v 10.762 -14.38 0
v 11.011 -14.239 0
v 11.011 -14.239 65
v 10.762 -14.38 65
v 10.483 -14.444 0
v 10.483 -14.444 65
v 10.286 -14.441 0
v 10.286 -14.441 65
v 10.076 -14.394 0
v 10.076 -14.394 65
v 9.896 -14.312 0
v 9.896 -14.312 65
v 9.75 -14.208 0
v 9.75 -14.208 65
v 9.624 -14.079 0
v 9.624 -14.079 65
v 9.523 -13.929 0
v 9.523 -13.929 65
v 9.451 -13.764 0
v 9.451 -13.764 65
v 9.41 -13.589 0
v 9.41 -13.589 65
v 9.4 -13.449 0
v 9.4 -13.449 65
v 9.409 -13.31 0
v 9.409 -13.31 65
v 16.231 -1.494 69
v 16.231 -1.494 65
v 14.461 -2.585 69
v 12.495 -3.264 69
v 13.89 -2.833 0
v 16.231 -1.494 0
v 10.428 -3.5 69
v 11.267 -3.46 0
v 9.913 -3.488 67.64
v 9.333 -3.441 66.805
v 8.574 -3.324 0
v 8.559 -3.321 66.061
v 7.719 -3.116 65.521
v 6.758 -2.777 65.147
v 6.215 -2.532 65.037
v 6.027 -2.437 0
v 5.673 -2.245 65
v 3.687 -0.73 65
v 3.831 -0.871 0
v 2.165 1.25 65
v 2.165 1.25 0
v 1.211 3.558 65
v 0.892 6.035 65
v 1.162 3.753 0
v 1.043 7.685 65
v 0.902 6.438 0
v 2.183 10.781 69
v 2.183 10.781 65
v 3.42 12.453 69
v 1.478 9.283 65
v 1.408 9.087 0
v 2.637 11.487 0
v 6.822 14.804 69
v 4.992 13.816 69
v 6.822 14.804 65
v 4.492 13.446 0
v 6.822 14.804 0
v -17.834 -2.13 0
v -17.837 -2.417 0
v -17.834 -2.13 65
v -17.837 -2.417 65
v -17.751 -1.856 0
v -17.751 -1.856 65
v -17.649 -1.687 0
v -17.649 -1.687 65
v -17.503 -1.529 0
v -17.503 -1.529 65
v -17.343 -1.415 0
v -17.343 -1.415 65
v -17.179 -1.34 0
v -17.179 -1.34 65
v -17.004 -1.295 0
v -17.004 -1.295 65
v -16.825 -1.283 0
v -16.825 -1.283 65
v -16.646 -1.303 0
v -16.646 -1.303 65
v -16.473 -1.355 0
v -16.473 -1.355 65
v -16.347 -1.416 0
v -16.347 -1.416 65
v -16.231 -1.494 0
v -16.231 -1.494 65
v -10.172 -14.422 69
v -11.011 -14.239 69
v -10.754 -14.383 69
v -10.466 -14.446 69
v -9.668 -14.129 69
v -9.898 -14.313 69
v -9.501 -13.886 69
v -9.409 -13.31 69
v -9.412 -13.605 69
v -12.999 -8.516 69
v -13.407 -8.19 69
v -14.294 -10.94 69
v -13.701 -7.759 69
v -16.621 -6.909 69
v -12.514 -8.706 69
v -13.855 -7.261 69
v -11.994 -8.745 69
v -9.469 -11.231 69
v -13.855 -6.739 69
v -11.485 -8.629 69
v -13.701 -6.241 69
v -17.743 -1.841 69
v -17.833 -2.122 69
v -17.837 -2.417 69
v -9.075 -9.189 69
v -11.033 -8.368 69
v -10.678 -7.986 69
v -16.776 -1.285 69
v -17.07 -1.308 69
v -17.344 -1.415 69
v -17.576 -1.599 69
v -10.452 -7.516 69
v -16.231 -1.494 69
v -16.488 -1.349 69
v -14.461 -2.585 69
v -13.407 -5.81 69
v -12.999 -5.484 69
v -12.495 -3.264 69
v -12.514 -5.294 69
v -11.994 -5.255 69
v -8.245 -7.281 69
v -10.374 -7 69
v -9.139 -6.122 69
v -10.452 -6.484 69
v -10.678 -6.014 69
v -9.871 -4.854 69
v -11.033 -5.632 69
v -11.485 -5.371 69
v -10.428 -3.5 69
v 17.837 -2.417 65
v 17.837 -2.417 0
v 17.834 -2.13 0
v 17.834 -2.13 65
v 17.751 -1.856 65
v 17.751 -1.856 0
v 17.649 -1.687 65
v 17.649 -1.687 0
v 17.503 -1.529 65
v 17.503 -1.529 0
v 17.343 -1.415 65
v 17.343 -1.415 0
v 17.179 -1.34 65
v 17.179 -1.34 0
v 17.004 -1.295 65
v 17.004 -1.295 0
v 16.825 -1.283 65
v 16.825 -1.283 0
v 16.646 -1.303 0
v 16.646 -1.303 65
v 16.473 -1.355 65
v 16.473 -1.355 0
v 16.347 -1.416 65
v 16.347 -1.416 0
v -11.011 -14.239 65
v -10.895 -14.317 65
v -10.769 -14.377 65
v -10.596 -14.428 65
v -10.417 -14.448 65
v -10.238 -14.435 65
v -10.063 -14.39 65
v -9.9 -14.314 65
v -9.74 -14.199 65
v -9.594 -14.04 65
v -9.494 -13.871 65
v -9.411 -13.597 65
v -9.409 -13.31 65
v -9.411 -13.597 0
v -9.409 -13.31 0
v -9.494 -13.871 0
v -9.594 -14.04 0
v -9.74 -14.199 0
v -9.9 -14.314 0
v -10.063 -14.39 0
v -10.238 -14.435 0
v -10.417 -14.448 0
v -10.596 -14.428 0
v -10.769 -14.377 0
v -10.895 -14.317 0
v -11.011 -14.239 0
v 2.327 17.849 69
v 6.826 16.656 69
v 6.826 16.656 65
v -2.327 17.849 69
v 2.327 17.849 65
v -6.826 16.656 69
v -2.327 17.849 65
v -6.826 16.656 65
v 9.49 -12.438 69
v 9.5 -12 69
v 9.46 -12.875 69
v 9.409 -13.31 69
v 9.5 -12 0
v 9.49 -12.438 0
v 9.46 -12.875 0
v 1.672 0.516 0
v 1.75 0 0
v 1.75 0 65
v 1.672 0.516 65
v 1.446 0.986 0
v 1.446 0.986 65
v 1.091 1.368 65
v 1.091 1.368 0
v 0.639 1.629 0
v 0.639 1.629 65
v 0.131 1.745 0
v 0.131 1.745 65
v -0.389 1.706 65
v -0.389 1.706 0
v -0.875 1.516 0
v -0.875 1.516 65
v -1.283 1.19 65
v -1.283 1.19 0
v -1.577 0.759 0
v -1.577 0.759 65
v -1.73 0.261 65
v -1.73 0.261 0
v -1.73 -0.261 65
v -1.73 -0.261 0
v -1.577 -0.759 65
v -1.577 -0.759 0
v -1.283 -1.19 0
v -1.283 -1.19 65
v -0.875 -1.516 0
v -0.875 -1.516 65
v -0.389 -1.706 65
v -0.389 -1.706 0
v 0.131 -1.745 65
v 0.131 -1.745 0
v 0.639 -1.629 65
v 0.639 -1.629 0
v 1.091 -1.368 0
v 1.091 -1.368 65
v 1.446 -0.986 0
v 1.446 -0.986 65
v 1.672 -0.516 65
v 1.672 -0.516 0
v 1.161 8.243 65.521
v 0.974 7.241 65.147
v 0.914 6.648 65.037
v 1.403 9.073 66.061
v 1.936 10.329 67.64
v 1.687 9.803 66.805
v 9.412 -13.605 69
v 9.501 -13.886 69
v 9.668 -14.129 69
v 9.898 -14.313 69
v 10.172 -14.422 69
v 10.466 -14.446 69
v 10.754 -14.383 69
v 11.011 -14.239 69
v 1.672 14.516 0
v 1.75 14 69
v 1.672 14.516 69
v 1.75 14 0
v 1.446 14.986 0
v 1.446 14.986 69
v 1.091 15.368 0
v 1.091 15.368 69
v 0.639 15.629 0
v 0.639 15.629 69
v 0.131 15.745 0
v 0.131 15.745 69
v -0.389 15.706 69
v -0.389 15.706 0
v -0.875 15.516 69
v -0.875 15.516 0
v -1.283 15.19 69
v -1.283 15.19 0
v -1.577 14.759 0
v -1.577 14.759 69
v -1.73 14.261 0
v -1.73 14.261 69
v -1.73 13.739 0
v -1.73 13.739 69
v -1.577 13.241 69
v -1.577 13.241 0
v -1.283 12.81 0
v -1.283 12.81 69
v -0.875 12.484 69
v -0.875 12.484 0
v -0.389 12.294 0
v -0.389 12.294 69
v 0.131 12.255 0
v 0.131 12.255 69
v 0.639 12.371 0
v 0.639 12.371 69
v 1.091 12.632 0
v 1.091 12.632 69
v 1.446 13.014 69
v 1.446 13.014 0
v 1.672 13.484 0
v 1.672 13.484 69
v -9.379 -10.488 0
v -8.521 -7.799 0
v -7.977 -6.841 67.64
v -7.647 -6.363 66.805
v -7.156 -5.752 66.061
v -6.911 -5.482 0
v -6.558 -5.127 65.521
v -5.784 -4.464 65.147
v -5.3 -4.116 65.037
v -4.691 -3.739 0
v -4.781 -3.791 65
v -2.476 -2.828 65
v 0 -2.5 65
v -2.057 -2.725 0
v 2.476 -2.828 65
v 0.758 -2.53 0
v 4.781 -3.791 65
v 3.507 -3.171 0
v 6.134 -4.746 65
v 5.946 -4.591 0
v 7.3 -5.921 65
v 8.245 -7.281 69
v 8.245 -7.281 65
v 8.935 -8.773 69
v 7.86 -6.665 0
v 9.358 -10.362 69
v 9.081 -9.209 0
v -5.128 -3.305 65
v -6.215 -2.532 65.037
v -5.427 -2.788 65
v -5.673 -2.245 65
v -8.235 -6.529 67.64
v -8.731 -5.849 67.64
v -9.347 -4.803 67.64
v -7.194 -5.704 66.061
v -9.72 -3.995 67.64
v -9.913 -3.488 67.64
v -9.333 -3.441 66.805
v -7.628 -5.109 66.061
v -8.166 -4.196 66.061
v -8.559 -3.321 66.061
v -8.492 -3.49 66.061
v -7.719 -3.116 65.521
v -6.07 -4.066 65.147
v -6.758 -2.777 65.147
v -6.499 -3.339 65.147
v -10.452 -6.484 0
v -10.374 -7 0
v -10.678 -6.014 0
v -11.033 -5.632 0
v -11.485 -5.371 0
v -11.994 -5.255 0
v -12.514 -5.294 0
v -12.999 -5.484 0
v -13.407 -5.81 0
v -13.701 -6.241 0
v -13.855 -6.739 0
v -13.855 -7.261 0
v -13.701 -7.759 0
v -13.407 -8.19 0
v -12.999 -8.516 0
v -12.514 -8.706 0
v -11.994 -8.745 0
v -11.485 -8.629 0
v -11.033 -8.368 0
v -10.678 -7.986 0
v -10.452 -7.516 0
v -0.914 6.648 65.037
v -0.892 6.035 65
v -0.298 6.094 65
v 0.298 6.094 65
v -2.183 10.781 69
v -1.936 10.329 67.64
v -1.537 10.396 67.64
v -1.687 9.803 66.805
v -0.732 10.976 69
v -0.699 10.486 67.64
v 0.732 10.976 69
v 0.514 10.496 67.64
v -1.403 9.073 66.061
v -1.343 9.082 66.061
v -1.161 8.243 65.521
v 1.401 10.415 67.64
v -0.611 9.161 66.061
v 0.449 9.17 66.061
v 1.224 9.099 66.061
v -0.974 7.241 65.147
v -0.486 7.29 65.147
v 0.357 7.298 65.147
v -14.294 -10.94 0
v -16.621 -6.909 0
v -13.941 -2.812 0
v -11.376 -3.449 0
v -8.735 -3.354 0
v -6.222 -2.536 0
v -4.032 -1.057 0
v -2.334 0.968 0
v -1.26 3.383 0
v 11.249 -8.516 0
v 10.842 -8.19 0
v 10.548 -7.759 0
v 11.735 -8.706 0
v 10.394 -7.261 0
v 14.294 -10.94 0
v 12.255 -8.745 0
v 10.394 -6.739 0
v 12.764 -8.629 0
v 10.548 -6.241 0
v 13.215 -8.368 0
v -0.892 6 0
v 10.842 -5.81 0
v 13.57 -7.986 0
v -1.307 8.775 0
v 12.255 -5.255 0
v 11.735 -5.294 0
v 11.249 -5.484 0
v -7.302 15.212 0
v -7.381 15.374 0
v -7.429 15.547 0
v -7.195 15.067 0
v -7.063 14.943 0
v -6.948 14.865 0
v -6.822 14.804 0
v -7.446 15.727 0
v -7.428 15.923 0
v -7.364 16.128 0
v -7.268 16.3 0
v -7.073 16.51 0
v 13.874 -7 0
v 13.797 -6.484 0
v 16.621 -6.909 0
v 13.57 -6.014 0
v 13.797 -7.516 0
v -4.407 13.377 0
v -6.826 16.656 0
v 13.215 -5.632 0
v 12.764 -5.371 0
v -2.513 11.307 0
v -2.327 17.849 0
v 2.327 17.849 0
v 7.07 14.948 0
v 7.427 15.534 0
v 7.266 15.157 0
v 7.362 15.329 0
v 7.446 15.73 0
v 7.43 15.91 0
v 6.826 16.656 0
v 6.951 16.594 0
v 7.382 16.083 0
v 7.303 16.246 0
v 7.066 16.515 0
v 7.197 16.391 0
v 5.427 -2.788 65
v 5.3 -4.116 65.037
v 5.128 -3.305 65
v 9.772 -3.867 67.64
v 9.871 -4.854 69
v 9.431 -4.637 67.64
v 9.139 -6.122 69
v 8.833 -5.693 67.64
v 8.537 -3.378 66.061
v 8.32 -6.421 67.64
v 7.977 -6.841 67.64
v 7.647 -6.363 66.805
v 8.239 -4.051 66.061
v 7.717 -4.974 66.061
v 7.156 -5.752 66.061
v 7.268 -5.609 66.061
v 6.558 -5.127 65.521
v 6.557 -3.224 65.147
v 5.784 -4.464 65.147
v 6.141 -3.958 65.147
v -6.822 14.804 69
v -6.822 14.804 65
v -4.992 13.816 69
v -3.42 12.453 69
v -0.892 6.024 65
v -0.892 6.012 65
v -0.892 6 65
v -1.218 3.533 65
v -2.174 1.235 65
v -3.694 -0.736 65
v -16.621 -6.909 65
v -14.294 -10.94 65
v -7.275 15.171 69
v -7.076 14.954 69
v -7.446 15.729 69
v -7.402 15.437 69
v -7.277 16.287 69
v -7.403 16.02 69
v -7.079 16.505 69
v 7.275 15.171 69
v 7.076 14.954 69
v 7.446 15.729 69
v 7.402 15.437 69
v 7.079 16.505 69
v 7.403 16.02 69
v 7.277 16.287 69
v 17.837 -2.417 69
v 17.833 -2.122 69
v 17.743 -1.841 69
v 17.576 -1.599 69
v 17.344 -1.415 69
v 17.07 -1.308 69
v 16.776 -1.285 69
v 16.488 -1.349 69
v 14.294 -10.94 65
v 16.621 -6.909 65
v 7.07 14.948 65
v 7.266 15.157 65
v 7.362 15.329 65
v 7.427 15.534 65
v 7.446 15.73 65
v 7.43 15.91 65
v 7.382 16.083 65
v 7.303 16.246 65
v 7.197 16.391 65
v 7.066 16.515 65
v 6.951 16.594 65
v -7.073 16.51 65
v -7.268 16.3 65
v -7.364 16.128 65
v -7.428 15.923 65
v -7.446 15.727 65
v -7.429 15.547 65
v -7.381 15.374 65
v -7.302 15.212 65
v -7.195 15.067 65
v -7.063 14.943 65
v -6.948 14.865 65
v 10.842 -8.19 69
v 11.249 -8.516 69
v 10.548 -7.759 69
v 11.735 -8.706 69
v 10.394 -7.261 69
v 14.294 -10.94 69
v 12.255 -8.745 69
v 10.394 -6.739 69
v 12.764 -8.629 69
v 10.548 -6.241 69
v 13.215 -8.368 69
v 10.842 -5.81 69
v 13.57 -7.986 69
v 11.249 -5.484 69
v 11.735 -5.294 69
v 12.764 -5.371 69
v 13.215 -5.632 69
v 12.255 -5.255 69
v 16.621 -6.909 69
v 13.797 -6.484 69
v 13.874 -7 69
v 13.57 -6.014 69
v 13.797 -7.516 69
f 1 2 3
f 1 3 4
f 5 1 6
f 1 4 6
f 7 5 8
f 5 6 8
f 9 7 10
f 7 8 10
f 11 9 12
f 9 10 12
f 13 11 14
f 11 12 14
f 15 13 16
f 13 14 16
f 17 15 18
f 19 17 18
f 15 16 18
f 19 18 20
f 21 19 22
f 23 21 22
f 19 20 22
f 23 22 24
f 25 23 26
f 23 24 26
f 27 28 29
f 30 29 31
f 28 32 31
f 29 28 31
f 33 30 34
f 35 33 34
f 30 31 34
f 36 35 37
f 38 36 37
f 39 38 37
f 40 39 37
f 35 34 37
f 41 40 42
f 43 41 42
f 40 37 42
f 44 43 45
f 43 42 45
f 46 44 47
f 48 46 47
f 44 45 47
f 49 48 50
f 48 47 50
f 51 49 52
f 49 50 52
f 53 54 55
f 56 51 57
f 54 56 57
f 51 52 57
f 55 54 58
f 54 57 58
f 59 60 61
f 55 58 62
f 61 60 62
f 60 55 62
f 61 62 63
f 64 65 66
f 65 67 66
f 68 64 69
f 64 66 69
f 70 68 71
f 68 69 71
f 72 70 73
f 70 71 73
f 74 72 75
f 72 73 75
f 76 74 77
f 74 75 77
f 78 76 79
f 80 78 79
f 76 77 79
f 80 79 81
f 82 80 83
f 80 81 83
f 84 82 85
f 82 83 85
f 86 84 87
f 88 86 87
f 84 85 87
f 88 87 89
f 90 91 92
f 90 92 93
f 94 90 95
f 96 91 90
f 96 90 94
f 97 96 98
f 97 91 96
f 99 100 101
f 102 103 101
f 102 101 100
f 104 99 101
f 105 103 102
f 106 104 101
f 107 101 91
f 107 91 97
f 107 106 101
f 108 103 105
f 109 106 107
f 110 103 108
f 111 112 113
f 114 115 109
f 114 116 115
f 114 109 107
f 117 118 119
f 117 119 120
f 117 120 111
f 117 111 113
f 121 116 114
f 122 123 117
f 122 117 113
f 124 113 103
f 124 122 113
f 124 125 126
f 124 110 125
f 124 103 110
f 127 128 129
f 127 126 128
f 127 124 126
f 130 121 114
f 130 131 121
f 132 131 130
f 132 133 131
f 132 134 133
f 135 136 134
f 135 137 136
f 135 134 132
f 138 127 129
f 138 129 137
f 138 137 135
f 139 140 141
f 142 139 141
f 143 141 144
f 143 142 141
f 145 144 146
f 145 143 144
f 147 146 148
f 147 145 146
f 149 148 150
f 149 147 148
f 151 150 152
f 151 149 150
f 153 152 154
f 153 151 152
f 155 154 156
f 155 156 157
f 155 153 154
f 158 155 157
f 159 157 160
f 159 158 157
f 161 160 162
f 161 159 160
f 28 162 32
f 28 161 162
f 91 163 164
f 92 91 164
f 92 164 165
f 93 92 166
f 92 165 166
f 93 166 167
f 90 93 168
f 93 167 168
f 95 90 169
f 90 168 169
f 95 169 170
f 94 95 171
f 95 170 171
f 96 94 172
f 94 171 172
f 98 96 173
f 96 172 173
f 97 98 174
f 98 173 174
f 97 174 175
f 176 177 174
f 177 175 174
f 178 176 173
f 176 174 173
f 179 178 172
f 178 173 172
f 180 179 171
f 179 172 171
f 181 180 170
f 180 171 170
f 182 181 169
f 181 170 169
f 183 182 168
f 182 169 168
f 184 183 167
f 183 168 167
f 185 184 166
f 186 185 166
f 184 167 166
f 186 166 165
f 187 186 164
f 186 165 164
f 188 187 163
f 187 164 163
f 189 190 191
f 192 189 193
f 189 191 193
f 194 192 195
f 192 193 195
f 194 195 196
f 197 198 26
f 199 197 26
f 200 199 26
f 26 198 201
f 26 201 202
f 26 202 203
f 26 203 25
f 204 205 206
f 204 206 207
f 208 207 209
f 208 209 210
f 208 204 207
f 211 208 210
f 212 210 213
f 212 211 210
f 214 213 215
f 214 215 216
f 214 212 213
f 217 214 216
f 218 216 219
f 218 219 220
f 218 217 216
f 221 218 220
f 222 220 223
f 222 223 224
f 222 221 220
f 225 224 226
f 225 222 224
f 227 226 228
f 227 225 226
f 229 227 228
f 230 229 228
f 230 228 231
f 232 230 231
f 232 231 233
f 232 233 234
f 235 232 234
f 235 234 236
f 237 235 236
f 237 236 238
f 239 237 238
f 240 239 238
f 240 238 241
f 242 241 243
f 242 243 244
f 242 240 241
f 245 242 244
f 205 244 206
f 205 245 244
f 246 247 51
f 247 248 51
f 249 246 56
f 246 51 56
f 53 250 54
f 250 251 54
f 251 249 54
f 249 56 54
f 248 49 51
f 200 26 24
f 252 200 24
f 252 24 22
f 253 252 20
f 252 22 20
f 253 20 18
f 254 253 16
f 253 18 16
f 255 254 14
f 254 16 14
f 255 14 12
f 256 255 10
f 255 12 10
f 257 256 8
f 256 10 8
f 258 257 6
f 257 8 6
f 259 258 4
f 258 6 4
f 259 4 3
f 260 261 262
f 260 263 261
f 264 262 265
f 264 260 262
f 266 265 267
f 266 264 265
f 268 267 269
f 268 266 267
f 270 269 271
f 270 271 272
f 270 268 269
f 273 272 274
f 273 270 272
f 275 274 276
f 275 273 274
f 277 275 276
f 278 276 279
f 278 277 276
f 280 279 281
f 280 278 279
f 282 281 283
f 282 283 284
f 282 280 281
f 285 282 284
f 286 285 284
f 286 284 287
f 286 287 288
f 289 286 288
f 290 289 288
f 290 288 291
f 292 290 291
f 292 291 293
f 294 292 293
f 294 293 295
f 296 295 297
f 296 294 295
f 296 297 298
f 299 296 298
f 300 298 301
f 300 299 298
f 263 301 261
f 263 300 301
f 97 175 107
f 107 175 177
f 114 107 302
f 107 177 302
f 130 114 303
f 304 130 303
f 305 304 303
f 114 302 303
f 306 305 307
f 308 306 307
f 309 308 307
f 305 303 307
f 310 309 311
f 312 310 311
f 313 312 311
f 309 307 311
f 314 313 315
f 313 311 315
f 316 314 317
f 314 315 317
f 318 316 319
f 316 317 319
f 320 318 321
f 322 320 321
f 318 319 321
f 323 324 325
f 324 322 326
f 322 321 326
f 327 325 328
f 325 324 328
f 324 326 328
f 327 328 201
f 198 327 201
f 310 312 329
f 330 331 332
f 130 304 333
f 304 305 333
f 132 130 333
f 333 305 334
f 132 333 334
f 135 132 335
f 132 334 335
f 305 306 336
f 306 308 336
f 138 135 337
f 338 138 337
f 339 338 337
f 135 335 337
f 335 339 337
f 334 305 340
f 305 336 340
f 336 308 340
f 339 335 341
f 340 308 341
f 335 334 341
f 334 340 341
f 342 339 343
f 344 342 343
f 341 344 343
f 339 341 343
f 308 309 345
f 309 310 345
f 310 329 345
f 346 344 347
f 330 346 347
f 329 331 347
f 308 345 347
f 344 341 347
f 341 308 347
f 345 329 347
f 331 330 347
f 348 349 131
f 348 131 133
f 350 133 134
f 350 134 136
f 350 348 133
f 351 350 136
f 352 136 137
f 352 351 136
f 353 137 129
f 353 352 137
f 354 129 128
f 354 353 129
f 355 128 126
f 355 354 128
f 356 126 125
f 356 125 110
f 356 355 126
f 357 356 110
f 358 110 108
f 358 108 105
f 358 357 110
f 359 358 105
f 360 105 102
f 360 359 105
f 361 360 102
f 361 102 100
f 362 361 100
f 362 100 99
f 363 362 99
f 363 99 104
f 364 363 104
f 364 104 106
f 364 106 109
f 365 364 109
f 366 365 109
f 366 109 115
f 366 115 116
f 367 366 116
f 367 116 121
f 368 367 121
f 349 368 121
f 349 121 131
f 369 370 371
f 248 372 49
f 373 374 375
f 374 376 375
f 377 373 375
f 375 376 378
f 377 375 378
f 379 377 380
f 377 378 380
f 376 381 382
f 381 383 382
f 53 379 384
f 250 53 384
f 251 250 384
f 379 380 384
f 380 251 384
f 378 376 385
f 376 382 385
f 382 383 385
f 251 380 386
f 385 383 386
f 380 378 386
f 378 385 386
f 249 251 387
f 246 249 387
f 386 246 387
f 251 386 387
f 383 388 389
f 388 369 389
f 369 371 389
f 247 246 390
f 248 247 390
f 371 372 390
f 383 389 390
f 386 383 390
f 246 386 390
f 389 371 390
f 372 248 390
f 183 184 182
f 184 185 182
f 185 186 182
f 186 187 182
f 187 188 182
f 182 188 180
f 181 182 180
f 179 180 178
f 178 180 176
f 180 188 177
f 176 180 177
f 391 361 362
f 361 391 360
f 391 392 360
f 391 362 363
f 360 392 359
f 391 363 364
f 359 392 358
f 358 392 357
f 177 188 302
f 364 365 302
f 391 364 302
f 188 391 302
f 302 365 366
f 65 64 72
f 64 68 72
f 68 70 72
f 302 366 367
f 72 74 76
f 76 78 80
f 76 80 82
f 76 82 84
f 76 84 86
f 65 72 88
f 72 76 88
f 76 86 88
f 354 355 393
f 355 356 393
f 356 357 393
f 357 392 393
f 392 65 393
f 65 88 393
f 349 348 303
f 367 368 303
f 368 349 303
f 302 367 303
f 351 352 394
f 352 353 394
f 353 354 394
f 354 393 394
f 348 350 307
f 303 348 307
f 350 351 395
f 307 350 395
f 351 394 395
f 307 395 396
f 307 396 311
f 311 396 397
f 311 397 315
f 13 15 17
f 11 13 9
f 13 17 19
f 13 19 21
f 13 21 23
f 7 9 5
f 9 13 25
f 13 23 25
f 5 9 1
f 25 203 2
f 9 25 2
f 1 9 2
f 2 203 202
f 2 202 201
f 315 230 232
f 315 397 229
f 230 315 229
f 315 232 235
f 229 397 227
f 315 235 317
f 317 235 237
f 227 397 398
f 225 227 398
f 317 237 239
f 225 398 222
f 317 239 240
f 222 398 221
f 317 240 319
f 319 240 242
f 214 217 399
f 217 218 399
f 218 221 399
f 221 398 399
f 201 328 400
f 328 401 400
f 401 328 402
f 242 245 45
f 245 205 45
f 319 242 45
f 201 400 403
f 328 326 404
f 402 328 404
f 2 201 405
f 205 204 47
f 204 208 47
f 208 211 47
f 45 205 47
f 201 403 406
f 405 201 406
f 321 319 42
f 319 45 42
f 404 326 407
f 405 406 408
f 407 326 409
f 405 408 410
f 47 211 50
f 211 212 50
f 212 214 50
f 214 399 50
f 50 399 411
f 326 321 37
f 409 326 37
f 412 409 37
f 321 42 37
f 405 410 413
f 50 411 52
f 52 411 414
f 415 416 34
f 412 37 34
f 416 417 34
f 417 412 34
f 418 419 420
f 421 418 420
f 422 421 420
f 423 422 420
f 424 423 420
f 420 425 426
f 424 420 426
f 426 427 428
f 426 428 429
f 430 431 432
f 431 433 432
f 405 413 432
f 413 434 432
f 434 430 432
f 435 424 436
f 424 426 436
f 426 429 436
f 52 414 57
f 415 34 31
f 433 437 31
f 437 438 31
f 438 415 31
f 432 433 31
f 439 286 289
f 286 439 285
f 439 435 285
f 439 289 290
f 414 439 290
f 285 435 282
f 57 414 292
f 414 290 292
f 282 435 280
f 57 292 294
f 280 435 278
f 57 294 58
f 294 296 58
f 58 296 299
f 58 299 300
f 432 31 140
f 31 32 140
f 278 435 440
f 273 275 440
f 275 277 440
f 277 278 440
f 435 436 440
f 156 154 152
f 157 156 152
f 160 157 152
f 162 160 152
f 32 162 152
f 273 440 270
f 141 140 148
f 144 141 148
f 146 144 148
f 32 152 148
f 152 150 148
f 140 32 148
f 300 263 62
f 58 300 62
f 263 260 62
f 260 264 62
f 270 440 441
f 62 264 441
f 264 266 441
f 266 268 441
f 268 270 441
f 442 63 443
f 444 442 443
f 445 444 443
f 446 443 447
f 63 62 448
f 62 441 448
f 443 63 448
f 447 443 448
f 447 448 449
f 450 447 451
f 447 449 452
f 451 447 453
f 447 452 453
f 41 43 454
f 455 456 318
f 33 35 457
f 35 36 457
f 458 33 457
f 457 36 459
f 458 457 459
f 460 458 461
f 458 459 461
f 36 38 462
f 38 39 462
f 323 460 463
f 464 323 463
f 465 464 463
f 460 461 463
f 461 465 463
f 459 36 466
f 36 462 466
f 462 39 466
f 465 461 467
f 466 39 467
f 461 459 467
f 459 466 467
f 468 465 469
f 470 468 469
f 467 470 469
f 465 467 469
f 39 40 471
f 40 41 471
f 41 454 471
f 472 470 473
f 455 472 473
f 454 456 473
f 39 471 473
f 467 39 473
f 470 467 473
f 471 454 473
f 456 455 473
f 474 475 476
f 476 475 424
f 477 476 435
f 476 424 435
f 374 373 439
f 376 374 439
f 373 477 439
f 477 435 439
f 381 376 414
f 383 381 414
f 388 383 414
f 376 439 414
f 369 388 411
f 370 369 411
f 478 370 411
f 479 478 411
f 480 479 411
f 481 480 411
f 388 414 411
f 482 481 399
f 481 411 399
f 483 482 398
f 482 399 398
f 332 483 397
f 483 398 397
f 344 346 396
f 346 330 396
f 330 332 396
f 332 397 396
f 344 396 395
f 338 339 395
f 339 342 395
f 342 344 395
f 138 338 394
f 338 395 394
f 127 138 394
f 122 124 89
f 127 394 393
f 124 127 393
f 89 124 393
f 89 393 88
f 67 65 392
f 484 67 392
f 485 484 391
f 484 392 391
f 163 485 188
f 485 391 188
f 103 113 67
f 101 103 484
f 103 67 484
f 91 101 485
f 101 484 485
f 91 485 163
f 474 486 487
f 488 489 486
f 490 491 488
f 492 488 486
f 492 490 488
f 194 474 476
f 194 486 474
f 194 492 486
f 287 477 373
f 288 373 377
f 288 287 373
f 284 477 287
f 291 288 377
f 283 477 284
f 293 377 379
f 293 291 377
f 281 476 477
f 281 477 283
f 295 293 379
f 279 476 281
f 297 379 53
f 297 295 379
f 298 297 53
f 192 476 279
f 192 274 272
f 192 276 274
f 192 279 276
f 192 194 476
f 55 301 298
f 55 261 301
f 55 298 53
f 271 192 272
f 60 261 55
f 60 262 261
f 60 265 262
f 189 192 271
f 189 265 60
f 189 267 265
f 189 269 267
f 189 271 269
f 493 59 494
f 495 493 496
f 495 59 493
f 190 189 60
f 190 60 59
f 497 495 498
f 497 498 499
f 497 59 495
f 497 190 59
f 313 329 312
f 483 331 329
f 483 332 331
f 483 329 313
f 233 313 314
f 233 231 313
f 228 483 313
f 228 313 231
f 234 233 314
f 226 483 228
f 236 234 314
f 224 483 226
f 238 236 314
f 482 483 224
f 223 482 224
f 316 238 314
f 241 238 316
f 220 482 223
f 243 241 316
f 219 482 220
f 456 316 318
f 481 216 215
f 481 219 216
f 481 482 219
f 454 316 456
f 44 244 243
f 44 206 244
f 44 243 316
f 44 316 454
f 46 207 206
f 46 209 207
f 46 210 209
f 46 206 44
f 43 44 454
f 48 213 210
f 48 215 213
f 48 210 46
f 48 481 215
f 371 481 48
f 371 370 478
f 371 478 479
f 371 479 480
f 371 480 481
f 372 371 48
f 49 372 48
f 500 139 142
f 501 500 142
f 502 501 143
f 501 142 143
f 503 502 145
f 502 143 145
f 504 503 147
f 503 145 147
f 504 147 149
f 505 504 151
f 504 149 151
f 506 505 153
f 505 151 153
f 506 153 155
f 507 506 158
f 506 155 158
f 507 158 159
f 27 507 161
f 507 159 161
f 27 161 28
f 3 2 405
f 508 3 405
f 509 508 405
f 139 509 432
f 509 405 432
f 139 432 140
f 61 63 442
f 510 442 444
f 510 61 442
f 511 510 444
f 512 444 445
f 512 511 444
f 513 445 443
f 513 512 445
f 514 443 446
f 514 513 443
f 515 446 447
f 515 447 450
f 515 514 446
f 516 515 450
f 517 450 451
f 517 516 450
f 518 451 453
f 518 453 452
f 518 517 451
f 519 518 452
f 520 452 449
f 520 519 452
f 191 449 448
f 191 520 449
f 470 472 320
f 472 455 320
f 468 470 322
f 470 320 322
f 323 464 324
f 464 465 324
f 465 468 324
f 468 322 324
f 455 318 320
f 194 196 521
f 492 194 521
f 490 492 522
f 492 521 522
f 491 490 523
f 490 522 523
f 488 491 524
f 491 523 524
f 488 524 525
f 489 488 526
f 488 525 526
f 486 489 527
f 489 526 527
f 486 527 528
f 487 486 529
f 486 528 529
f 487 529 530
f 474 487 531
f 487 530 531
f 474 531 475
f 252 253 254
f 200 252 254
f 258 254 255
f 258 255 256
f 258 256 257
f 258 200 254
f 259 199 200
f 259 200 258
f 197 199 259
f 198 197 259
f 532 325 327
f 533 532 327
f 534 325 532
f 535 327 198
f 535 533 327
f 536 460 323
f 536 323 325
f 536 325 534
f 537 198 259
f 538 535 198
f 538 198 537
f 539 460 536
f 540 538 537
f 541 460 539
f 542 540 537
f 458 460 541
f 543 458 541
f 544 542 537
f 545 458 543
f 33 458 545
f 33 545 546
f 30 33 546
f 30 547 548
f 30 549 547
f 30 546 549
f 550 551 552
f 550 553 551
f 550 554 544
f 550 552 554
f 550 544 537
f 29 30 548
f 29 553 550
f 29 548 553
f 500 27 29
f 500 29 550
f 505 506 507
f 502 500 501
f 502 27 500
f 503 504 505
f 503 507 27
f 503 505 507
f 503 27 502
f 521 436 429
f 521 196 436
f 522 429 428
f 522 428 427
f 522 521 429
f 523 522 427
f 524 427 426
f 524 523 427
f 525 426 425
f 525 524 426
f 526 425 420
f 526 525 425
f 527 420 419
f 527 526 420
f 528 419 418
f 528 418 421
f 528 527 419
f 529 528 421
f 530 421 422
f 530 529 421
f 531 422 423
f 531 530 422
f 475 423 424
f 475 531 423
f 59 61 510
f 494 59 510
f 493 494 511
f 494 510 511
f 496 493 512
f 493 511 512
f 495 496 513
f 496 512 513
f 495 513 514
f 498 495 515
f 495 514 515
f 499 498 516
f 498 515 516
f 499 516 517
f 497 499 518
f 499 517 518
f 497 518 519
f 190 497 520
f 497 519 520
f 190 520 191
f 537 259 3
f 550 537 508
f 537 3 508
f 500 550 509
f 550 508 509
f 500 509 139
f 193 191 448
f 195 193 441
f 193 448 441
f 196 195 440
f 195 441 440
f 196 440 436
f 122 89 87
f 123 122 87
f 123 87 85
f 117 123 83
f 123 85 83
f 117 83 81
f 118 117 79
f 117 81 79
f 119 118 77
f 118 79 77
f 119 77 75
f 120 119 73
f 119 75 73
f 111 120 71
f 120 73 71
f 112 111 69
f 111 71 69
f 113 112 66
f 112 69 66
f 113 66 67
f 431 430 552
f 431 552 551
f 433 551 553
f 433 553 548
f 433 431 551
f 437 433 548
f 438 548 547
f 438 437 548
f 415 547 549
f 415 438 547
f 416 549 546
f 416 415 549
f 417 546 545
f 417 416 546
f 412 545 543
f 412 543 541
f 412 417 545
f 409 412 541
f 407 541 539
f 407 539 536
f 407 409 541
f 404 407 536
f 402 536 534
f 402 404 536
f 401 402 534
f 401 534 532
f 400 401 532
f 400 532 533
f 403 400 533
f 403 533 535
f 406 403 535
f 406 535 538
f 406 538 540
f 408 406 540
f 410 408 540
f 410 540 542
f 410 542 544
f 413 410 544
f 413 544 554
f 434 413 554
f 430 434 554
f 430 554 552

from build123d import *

# Parameters (mm, degrees)
SKETCH_1_R      = 1.75
EXTRUDE_1_DEPTH = 65
FILLET_1_R      = 1
SKETCH_2_R      = 1.75
EXTRUDE_2_DEPTH = 4
FILLET_2_R      = 5


with BuildPart() as part:
    # Эскиз1 → Бобышка-Вытянуть1 (new body)
    with BuildSketch(Plane.XY):
        with BuildLine():
            ThreePointArc((8.733013025, -15.739583333), (15.511193288, -9.132517877), (18, 0))
            ThreePointArc((18, 0), (17.999346369, 0.153395838), (17.997385524, 0.306780536))
            ThreePointArc((17.997385524, 0.306780536), (2.165063509, 1.25), (9.264372499, 15.432802798))
            ThreePointArc((9.264372499, 15.432802798), (0, 18), (-9.264372499, 15.432802798))
            ThreePointArc((-9.264372499, 15.432802798), (-3.287188474, 12.30613363), (-0.892304845, 6))
            ThreePointArc((-0.892304845, 6), (-7.392160386, -3.013830108), (-17.997385524, 0.306780536))
            ThreePointArc((-17.997385524, 0.306780536), (-15.588457268, -9), (-8.733013025, -15.739583333))
            ThreePointArc((-8.733013025, -15.739583333), (-1.908713738, -2.693721911), (9.5, -12))
            ThreePointArc((9.5, -12), (9.306278089, -13.908713738), (8.733013025, -15.739583333))
        make_face()
        with Locations((-12.124355653, -7)):
            Circle(SKETCH_1_R, mode=Mode.SUBTRACT)
        with Locations((12.124355653, -7)):
            Circle(SKETCH_1_R, mode=Mode.SUBTRACT)
        Circle(SKETCH_1_R, mode=Mode.SUBTRACT)
        with Locations((0, 14)):
            Circle(SKETCH_1_R, mode=Mode.SUBTRACT)
    extrude(amount=EXTRUDE_1_DEPTH)

    # Скругление1
    fillet_1_edges = [part.edges().sort_by_distance(p)[0] for p in [
        (17.997385524, 0.306780536, 32.5),
        (8.733013025, -15.739583333, 32.5),
        (-8.733013025, -15.739583333, 32.5),
        (-17.997385524, 0.306780536, 32.5),
        (-9.264372499, 15.432802798, 32.5),
        (9.264372499, 15.432802798, 32.5),
    ]]
    fillet(fillet_1_edges, radius=FILLET_1_R)

    # Эскиз2 → Бобышка-Вытянуть2 (add)
    # profile 1 of 3: a face of its own
    with BuildSketch(Plane.XY.offset(65)):
        with BuildLine():
            ThreePointArc((6.822193962, 14.803653121), (7.446391133, 15.728518462), (6.825592394, 16.655668359))
            ThreePointArc((6.825592394, 16.655668359), (0, 18), (-6.825592394, 16.655668359))
            ThreePointArc((-6.825592394, 16.655668359), (-7.446391133, 15.728518462), (-6.822193962, 14.803653121))
            ThreePointArc((-6.822193962, 14.803653121), (-4.168730882, 13.177543251), (-2.183145185, 10.781181619))
            ThreePointArc((-2.183145185, 10.781181619), (0, 11), (2.183145185, 10.781181619))
            ThreePointArc((2.183145185, 10.781181619), (4.168730882, 13.177543251), (6.822193962, 14.803653121))
        make_face()
        with Locations((0, 14)):
            Circle(SKETCH_2_R, mode=Mode.SUBTRACT)
    # profile 2 of 3: a face of its own
    with BuildSketch(Plane.XY.offset(65)):
        with BuildLine():
            ThreePointArc((17.837028113, -2.41669777), (17.344492118, -1.415495343), (16.231436653, -1.49363328))
            ThreePointArc((16.231436653, -1.49363328), (13.496452656, -2.97854478), (10.428349757, -3.499931619))
            ThreePointArc((10.428349757, -3.499931619), (9.526279442, -5.5), (8.245204572, -7.28125))
            ThreePointArc((8.245204572, -7.28125), (9.1809434, -9.558631883), (9.5, -12))
            ThreePointArc((9.5, -12), (9.477283513, -12.656579941), (9.409242691, -13.310019841))
            ThreePointArc((9.409242691, -13.310019841), (9.898100985, -14.313023118), (11.011435719, -14.238970588))
            ThreePointArc((11.011435719, -14.238970588), (15.588457268, -9), (17.837028113, -2.41669777))
        make_face()
        with Locations((12.124355653, -7)):
            Circle(SKETCH_2_R, mode=Mode.SUBTRACT)
    # profile 3 of 3: a face of its own
    with BuildSketch(Plane.XY.offset(65)):
        with BuildLine():
            ThreePointArc((-10.428349757, -3.499931619), (-13.496452656, -2.97854478), (-16.231436653, -1.49363328))
            ThreePointArc((-16.231436653, -1.49363328), (-17.344492118, -1.415495343), (-17.837028113, -2.41669777))
            ThreePointArc((-17.837028113, -2.41669777), (-15.588457268, -9), (-11.011435719, -14.238970588))
            ThreePointArc((-11.011435719, -14.238970588), (-9.898100985, -14.313023118), (-9.409242691, -13.310019841))
            ThreePointArc((-9.409242691, -13.310019841), (-9.327721774, -10.198998471), (-8.245204572, -7.28125))
            ThreePointArc((-8.245204572, -7.28125), (-9.526279442, -5.5), (-10.428349757, -3.499931619))
        make_face()
        with Locations((-12.124355653, -7)):
            Circle(SKETCH_2_R, mode=Mode.SUBTRACT)
    extrude(amount=EXTRUDE_2_DEPTH)

    # Скругление2
    # the kernel refuses this fillet: 5 mm, written as the material it adds along each edge
    with BuildSketch(Plane(origin=(0, 0, 65), x_dir=(0.26290330045081145, -0.9648221880803066, 0), z_dir=(0.9648221880803066, 0.26290330045081145, 0))) as fillet_2_piece_1_section:
        with BuildLine():
            CenterArc((6.101020514, -5), FILLET_2_R, 11.536959033, 78.463040967)
            Line((6.101020514, 0), (6.101020514, 0.1))
            Line((6.101020514, 0.1), (11, 0.1))
            Line((11, 0.1), (11.1, 0))
            ThreePointArc((11.1, 0), (11.1, -2), (11.09797959, -3.98))
            Line((11.09797959, -3.98), (11, -4))
        make_face()
    fillet_2_piece_1 = revolve(axis=Axis((0, 0, 65), (0, 0, -1)), revolution_arc=150.484807428, mode=Mode.PRIVATE)
    fillet_2_piece_1 = fillet_2_piece_1 - Plane(origin=(-10.392304845, 6, 66.122013519), x_dir=(0.1187297206541081, 0.9929266102957446, 0), z_dir=(0, 0, -1)) * Cylinder(9.5, 45, mode=Mode.PRIVATE)
    fillet_2_piece_1 = fillet_2_piece_1 - Plane(origin=(0, -12, 66.122013519), x_dir=(-0.9192645289367253, -0.3936403508772196, 0), z_dir=(0, 0, -1)) * Cylinder(9.5, 45, mode=Mode.PRIVATE)
    add(fillet_2_piece_1)
    with BuildSketch(Plane(origin=(0, 0, 65), x_dir=(0.7041088747870229, 0.7100920309693333, 0), z_dir=(-0.7100920309693333, 0.7041088747870229, 0))) as fillet_2_piece_2_section:
        with BuildLine():
            CenterArc((6.101020514, -5), FILLET_2_R, 11.536959033, 78.463040967)
            Line((11, -4), (11.09797959, -3.98))
            ThreePointArc((11.09797959, -3.98), (11.1, -2), (11.1, 0))
            Line((11.1, 0), (11, 0.1))
            Line((11, 0.1), (6.101020514, 0.1))
            Line((6.101020514, 0.1), (6.101020514, 0))
        make_face()
    fillet_2_piece_2 = revolve(axis=Axis((0, 0, 65), (0, 0, -1)), revolution_arc=150.484807428, mode=Mode.PRIVATE)
    fillet_2_piece_2 = fillet_2_piece_2 - Plane(origin=(10.392304845, 6, 66.122013516), x_dir=(0.8005348082826462, -0.5992862594185411, 0), z_dir=(0, 0, -1)) * Cylinder(9.5, 45, mode=Mode.PRIVATE)
    fillet_2_piece_2 = fillet_2_piece_2 - Plane(origin=(0, -12, 66.122013516), x_dir=(-0.9192645289367253, -0.3936403508772196, 0), z_dir=(0, 0, -1)) * Cylinder(9.5, 45, mode=Mode.PRIVATE)
    add(fillet_2_piece_2)
    with BuildSketch(Plane(origin=(0, 0, 65), x_dir=(-0.9670121752378409, 0.2547301571109701, 0), z_dir=(-0.2547301571109701, -0.9670121752378409, 0))) as fillet_2_piece_3_section:
        with BuildLine():
            CenterArc((6.101020514, -5), FILLET_2_R, 11.536959033, 78.463040967)
            Line((6.101020514, 0), (6.101020514, 0.1))
            Line((6.101020514, 0.1), (11, 0.1))
            Line((11, 0.1), (11.1, 0))
            ThreePointArc((11.1, 0), (11.1, -2), (11.09797959, -3.98))
            Line((11.09797959, -3.98), (11, -4))
        make_face()
    fillet_2_piece_3 = revolve(axis=Axis((0, 0, 65), (0, 0, -1)), revolution_arc=150.484807428, mode=Mode.PRIVATE)
    fillet_2_piece_3 = fillet_2_piece_3 - Plane(origin=(10.392304845, 6, 66.122013519), x_dir=(0.8005348082826462, -0.5992862594185411, 0), z_dir=(0, 0, -1)) * Cylinder(9.5, 45, mode=Mode.PRIVATE)
    fillet_2_piece_3 = fillet_2_piece_3 - Plane(origin=(-10.392304845, 6, 66.122013519), x_dir=(0.1187297206541081, 0.9929266102957446, 0), z_dir=(0, 0, -1)) * Cylinder(9.5, 45, mode=Mode.PRIVATE)
    add(fillet_2_piece_3)


solid = part.part
